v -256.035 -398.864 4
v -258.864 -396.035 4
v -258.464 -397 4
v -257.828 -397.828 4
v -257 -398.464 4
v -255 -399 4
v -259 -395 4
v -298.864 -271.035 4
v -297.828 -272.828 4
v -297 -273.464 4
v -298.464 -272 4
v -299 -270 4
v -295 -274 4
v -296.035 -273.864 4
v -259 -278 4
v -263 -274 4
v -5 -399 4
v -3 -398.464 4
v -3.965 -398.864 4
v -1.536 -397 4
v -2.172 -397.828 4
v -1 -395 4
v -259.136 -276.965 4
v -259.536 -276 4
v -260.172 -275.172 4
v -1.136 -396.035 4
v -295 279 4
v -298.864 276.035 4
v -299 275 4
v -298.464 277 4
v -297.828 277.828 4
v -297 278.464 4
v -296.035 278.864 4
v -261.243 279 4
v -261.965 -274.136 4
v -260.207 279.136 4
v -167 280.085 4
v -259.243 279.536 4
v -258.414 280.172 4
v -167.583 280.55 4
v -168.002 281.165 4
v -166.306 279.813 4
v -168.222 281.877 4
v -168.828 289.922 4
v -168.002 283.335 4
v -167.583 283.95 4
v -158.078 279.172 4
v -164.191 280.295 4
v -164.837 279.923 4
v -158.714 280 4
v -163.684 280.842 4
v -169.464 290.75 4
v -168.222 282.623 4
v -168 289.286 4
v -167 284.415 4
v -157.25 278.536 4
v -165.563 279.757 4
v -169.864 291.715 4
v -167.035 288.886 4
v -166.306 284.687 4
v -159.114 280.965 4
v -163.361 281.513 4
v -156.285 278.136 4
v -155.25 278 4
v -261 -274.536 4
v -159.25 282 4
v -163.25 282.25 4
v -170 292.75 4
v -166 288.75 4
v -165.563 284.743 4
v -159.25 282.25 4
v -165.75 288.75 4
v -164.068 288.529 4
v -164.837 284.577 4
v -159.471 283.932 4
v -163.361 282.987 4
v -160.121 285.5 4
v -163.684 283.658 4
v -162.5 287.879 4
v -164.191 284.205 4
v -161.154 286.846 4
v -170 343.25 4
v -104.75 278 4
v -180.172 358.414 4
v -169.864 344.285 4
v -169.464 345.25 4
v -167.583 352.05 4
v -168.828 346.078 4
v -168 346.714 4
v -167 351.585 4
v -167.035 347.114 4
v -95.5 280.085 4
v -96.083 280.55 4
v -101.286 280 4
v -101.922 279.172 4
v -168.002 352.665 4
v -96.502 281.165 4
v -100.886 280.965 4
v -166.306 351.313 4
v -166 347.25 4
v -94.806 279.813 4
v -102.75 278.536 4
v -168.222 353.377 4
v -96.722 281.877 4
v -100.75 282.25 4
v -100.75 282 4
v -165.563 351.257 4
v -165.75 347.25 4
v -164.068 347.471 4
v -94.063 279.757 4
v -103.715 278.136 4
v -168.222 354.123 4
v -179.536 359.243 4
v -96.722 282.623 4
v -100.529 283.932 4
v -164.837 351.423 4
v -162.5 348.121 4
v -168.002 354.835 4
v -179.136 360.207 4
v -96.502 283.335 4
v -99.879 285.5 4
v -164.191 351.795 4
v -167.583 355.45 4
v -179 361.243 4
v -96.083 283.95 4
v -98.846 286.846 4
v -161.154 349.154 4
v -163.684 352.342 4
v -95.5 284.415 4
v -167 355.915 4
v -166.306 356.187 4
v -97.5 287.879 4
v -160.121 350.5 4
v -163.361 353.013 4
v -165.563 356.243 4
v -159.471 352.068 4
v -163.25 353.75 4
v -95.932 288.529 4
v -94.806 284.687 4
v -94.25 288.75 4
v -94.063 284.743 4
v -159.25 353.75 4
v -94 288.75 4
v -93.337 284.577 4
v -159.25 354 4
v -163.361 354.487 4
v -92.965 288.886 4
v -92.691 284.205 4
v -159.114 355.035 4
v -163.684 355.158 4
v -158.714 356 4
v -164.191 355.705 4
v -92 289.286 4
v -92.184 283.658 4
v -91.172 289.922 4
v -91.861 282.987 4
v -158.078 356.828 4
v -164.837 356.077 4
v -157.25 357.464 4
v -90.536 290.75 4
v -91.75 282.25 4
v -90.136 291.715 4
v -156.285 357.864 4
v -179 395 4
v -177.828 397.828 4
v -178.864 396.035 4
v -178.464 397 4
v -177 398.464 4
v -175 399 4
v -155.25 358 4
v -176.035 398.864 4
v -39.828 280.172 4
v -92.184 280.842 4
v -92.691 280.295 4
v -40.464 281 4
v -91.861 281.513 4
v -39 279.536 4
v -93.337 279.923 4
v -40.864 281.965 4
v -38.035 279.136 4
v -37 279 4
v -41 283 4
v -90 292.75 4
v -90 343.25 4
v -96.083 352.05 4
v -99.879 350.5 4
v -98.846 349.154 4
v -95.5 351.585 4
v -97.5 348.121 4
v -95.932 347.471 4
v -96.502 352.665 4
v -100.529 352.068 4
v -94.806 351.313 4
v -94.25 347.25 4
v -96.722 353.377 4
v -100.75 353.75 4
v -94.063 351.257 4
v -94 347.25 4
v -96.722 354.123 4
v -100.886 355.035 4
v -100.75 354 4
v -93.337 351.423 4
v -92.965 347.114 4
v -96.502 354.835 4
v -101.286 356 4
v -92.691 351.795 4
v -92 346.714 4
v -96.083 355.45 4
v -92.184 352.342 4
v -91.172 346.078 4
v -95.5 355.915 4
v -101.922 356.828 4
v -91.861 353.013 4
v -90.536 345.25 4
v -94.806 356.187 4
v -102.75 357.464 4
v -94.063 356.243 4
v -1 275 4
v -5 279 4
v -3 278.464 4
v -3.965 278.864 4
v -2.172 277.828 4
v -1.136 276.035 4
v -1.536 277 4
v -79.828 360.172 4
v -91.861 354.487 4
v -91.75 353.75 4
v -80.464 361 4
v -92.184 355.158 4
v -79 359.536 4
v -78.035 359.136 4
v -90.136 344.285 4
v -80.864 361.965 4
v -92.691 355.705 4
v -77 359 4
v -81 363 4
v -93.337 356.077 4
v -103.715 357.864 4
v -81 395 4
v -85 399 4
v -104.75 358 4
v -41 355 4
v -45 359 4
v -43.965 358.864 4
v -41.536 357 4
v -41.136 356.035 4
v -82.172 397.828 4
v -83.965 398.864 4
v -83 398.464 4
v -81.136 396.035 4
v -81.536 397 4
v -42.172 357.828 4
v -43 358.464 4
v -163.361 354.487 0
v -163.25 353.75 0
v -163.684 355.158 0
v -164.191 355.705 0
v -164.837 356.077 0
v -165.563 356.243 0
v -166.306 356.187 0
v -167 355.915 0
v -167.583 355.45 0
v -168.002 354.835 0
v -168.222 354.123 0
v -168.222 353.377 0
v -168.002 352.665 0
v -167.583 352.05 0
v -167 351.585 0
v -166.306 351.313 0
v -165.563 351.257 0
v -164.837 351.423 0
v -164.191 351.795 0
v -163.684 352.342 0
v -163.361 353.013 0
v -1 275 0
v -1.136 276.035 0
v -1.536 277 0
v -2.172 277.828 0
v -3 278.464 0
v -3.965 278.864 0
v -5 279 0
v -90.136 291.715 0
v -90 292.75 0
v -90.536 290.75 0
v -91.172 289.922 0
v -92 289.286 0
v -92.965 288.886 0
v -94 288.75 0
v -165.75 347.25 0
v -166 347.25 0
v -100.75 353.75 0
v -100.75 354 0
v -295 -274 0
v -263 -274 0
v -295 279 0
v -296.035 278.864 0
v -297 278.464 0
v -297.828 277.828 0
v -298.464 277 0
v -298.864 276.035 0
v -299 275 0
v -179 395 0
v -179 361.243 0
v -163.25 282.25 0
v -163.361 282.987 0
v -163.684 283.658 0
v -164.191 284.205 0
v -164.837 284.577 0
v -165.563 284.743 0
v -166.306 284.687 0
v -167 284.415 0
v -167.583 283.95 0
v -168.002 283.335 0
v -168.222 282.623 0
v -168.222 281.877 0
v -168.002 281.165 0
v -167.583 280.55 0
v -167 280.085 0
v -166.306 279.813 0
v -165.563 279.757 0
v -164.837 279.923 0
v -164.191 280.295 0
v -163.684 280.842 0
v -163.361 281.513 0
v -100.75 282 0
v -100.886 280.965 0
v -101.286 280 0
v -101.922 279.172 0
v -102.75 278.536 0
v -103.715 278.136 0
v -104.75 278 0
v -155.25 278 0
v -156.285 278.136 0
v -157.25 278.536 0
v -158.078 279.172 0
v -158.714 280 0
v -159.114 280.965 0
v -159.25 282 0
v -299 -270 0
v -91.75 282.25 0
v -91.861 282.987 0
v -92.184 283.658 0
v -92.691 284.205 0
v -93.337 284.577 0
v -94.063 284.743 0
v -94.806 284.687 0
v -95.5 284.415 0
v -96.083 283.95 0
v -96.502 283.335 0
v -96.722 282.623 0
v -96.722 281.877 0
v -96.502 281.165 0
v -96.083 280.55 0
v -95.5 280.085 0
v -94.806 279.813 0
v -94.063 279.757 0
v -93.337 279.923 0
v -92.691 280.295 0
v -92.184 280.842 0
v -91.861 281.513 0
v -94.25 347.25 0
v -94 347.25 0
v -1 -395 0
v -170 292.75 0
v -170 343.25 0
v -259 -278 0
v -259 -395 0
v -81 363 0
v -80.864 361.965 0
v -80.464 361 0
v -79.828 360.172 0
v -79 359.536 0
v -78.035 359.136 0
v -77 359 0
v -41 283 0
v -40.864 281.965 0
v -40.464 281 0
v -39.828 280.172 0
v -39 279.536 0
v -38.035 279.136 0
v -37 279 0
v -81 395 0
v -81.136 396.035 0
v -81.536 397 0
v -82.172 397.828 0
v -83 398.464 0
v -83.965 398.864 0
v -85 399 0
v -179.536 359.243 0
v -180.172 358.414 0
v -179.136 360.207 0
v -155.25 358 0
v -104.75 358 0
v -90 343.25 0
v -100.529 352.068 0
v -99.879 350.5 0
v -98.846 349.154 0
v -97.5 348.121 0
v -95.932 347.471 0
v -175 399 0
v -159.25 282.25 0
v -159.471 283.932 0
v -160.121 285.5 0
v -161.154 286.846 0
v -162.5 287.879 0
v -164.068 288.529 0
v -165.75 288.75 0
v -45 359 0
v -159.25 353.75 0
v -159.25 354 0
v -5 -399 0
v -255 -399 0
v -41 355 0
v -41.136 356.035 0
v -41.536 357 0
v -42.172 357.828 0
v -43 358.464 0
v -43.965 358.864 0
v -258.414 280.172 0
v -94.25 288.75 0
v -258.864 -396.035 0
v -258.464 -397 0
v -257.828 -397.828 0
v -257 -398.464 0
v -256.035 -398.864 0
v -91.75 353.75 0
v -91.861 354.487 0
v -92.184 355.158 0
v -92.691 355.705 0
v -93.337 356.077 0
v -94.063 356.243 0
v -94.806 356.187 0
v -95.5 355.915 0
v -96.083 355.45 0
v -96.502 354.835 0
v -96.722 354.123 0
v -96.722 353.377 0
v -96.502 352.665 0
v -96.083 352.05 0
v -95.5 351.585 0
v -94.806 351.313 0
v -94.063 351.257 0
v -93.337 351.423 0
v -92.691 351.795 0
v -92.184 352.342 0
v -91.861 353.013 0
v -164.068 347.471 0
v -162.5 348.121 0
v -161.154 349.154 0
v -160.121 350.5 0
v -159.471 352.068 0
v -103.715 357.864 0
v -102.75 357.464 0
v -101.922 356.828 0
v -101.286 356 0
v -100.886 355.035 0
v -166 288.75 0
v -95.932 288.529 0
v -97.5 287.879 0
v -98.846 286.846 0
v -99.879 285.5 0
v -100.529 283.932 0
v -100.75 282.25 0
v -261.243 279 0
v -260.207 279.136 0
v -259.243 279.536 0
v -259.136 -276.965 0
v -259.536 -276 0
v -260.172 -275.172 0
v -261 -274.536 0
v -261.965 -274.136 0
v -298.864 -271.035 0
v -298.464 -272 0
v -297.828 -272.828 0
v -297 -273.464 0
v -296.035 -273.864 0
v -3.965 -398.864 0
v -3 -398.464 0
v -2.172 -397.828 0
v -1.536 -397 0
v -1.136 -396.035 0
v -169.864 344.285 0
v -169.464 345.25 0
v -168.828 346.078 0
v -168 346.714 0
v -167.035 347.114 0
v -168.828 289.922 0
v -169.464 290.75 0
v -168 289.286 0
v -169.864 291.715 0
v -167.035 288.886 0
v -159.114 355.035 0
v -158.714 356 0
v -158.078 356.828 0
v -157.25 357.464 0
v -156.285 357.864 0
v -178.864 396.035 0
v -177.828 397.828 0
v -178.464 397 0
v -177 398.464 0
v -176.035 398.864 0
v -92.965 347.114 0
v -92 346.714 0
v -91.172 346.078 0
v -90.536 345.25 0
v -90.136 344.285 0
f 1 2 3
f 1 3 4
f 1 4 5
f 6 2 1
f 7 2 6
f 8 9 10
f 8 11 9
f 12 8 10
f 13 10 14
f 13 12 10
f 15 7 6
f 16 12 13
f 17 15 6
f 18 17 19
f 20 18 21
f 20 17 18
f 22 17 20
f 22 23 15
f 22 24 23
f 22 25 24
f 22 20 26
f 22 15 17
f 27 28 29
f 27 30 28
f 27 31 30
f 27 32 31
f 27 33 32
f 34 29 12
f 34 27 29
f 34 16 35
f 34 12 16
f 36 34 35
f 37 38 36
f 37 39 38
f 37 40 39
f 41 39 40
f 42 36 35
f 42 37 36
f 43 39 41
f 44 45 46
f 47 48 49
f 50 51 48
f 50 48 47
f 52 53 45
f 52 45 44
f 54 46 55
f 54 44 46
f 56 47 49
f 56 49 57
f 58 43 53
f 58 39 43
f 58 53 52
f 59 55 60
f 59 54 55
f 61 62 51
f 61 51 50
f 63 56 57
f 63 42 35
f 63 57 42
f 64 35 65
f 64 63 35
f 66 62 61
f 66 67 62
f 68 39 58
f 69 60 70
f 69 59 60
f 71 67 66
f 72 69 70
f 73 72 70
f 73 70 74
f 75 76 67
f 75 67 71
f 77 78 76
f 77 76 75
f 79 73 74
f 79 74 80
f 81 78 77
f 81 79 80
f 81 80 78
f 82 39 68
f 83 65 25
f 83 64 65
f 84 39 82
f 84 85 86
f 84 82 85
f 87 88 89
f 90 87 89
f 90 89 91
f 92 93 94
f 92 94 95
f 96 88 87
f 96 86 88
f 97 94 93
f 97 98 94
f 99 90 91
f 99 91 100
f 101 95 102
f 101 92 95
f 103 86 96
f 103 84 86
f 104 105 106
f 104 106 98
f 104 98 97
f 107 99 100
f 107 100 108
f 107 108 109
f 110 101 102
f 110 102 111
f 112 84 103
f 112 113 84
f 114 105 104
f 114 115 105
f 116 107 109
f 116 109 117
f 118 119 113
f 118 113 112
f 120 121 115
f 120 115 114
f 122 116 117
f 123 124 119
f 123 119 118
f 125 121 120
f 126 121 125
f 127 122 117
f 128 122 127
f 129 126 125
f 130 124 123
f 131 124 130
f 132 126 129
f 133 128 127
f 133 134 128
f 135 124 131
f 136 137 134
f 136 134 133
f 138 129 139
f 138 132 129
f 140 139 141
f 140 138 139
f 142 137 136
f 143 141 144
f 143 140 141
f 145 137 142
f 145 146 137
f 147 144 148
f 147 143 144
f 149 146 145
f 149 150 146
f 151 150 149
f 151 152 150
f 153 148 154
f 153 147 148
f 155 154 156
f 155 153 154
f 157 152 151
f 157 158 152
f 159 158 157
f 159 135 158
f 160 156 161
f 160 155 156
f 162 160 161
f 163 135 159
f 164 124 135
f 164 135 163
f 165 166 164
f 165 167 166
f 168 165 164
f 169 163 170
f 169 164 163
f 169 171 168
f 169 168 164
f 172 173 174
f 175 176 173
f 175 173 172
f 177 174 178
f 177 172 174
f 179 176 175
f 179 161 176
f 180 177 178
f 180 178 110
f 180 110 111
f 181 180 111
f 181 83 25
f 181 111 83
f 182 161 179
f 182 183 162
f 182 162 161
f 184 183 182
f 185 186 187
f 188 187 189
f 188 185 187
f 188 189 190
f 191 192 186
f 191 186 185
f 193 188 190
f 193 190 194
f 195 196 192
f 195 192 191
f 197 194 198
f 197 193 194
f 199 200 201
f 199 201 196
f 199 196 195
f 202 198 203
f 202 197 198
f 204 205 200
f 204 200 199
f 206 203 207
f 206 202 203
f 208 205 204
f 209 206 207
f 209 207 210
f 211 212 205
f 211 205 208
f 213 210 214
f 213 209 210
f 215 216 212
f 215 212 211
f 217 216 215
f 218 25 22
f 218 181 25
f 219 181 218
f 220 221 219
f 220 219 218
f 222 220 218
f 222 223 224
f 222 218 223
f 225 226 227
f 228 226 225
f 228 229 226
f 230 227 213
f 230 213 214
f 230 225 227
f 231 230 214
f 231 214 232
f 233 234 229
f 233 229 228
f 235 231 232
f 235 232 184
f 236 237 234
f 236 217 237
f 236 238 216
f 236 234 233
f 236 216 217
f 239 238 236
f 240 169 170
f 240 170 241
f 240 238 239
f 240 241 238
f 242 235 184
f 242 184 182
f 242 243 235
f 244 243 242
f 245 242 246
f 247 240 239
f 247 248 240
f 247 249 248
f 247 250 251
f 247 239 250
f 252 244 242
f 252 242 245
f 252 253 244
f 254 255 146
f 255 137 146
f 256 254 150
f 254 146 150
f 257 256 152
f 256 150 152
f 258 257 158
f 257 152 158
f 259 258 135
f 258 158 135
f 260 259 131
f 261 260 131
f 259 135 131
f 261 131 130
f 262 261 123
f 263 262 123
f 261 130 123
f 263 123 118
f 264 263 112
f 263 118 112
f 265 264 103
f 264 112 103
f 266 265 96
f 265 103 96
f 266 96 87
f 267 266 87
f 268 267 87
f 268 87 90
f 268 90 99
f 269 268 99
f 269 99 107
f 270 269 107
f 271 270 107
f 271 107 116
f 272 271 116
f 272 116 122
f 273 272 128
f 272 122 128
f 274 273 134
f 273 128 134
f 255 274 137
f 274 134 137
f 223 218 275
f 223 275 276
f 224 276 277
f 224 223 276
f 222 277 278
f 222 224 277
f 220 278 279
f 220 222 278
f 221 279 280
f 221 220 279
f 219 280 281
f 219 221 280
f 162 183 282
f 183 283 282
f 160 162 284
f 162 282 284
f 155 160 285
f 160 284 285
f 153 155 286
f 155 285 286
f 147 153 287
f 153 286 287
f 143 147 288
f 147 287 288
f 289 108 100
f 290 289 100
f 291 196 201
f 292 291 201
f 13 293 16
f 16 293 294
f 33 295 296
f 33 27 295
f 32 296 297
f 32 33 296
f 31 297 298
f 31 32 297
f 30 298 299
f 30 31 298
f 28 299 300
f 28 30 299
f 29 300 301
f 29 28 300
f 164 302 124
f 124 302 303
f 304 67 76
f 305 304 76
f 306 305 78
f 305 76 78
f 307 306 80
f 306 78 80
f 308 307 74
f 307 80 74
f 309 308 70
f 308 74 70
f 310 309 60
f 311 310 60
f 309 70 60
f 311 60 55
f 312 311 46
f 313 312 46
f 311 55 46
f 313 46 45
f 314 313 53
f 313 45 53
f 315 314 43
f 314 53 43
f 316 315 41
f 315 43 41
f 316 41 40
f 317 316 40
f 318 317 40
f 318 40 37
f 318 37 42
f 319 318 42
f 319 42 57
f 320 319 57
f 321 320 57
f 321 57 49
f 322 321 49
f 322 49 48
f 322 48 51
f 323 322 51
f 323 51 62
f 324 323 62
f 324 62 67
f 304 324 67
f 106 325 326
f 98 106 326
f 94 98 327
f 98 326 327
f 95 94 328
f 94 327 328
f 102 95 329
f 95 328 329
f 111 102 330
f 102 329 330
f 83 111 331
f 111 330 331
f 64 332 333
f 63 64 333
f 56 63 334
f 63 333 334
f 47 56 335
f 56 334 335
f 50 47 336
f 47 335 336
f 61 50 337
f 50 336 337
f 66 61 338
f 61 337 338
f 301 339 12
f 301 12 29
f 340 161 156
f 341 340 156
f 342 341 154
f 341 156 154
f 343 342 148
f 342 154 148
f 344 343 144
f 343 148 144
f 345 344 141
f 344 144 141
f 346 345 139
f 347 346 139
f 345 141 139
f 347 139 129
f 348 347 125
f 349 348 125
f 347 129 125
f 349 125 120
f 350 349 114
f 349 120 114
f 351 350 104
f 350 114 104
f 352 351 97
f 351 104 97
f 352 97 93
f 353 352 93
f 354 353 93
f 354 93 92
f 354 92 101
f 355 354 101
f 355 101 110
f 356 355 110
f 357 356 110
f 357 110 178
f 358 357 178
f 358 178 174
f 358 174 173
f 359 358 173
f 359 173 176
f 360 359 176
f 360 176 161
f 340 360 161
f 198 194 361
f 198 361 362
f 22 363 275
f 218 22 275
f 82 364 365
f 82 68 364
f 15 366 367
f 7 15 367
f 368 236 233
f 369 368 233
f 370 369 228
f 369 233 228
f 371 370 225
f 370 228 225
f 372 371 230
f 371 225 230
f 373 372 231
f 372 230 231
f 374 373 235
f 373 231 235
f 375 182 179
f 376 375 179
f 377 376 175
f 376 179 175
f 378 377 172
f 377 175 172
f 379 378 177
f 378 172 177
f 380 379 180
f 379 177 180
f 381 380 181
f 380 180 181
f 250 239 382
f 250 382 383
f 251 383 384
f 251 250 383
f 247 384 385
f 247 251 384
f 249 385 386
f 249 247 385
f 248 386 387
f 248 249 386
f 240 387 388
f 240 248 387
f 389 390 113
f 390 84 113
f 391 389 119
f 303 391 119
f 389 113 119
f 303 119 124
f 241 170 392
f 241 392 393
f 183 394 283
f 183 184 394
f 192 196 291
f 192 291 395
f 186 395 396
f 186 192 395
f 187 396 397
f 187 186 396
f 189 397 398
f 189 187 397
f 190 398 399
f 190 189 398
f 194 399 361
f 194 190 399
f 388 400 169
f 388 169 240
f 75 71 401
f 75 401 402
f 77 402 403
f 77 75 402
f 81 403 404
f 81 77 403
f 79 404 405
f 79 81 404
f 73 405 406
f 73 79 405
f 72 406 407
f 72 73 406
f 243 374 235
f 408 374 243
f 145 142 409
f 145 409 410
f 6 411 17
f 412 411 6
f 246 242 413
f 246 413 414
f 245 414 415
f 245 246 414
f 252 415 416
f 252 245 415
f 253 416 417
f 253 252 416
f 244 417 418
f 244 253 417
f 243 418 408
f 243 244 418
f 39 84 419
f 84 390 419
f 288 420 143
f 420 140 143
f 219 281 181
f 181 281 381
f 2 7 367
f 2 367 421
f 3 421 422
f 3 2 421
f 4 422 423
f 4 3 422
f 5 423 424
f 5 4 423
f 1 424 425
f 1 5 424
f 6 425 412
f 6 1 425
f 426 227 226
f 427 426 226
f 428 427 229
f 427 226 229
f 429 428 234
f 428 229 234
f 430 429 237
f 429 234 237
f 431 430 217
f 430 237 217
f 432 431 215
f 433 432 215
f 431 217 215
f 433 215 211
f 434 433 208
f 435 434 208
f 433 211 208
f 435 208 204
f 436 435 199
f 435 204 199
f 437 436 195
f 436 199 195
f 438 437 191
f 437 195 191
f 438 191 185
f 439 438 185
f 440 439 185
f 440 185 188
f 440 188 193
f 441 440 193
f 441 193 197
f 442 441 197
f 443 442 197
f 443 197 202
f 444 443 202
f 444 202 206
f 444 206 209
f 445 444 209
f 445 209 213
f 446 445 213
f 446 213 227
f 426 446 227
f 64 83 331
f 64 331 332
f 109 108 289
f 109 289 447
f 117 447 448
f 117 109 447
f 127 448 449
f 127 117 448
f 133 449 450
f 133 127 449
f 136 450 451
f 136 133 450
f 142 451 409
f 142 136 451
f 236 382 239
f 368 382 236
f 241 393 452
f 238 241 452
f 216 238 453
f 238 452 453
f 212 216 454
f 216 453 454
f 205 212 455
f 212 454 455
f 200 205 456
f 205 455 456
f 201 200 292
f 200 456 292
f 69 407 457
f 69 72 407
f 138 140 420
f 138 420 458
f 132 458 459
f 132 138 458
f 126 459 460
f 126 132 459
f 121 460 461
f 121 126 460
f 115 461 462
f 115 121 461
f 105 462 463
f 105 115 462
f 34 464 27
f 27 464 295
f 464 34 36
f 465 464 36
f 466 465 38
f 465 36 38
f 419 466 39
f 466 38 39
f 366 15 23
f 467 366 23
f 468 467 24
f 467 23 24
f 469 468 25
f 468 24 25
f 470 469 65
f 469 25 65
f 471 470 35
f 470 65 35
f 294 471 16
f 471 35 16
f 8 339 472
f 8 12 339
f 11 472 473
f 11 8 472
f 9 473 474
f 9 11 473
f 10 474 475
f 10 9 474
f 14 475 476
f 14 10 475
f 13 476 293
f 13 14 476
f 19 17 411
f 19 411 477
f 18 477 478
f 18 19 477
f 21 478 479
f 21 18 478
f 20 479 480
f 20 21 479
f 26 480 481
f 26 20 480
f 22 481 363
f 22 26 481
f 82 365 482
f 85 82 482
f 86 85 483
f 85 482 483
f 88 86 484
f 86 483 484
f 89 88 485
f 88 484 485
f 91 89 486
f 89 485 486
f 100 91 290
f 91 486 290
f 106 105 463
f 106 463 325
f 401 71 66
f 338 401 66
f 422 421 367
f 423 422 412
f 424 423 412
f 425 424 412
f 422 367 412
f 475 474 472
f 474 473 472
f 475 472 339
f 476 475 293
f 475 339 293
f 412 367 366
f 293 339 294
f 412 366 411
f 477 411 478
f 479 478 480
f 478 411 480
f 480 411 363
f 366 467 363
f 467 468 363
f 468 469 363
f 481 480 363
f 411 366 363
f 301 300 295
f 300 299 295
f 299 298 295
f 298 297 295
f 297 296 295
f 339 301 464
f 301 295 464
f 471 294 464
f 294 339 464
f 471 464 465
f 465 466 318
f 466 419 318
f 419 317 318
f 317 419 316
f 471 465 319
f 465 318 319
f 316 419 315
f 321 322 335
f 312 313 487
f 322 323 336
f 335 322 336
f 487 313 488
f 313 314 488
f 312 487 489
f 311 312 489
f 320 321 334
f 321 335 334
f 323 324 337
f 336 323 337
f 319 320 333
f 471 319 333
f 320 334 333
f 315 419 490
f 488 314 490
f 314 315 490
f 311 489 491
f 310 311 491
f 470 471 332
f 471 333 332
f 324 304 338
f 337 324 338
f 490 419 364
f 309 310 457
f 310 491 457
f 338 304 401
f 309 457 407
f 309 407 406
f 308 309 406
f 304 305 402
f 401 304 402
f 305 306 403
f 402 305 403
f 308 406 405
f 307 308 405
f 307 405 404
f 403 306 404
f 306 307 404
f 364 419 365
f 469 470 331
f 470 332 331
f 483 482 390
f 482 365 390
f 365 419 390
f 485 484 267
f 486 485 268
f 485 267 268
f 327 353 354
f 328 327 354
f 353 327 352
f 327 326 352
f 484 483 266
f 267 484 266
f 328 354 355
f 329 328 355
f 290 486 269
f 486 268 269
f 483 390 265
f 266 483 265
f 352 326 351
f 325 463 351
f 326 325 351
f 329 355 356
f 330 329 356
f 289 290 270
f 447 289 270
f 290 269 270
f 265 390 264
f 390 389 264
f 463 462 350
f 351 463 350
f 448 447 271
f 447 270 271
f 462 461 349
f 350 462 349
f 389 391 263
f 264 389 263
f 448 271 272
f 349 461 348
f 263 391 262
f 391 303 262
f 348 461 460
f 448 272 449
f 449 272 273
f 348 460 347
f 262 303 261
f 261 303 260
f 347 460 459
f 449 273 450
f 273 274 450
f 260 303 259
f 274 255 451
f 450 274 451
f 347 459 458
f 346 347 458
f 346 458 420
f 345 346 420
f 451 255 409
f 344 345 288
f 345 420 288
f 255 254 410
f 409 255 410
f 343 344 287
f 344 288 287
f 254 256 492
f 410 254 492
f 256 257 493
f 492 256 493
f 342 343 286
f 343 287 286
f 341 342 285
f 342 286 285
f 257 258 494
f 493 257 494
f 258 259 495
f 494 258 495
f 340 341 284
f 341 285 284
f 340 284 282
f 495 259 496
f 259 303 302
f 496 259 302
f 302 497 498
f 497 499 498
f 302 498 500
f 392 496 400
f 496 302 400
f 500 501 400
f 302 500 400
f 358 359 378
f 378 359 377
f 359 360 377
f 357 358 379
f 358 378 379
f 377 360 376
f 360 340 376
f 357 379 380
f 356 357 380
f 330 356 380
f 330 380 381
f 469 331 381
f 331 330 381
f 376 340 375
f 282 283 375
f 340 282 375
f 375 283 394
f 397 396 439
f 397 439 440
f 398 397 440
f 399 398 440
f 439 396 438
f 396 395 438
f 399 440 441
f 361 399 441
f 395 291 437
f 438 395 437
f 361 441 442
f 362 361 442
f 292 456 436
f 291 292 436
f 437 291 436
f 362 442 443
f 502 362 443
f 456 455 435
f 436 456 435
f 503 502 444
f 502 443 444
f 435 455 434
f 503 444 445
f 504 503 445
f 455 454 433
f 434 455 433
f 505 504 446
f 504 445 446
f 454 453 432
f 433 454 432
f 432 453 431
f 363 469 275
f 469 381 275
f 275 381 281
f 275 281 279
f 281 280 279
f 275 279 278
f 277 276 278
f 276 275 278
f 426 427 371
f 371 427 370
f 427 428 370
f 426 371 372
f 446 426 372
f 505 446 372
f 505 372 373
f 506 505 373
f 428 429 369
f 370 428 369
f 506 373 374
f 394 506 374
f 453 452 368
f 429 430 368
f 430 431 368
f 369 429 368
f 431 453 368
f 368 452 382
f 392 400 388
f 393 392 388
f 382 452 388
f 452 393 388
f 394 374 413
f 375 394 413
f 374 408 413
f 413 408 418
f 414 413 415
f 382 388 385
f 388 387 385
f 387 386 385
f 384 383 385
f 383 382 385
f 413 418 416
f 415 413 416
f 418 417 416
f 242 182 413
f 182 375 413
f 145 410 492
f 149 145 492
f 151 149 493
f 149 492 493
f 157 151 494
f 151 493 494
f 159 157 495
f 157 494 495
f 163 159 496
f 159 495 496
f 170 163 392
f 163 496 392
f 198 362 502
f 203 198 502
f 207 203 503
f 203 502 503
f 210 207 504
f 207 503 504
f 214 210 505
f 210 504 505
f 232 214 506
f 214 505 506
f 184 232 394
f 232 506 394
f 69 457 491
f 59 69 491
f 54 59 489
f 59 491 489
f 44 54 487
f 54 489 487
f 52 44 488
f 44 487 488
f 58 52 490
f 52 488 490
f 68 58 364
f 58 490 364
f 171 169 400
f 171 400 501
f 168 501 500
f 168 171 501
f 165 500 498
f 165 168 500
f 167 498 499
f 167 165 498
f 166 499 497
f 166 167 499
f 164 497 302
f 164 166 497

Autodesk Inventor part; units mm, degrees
ref_plane "YZ Plane" through (0, 0, 0) normal (1, 0, 0) x (0, 1, 0)
ref_plane "XZ Plane" through (0, 0, 0) normal (0, 1, 0) x (-1, 0, 0)
ref_plane "XY Plane" through (0, 0, 0) normal (0, 0, 1) x (1, 0, 0)
sketch "Sketch1" plane through (0, 0, 0) normal (0, 0, 1) x (1, 0, 0)
  line L0 (-300, -400) -> (300, -400)
  line L1 (300, -400) -> (300, 400)
  line L2 (300, 400) -> (-300, 400)
  line L3 (-300, 400) -> (-300, -400)
  line L4 (-300, -400) -> (300, 400) construction
  line L5 (300, -400) -> (-300, 400) construction
  line L6 (-80, 360) -> (80, 360)
  line L7 (80, 360) -> (80, 400)
  line L8 (80, 400) -> (-80, 400)
  line L9 (-80, 400) -> (-80, 360)
  line L10 (-80, 360) -> (80, 400) construction
  line L11 (80, 360) -> (-80, 400) construction
  line L12 (-300, 280) -> (-260, 280)
  line L13 (-260, 280) -> (-180, 360)
  line L14 (-180, 360) -> (-180, 400)
  line L15 (180, 400) -> (180, 360)
  line L16 (180, 360) -> (260, 280)
  line L17 (260, 280) -> (300, 280)
  line L18 (-300, -275) -> (-260, -275)
  line L19 (-260, -275) -> (-260, -400)
  line L20 (300, -280) -> (260, -280)
  line L21 (260, -280) -> (260, -400)
  line L22 (0, 0) -> (0, 380) construction
  line L23 (-1, 360) -> (1, 360)
  line L24 (1, 360) -> (1, -400)
  line L25 (1, -400) -> (-1, -400)
  line L26 (-1, -400) -> (-1, 360)
  line L27 (-179, 400) -> (-179, 359.5858)
  line L28 (-179, 359.5858) -> (-259.5858, 279)
  line L29 (-259.5858, 279) -> (-300, 279)
  line L30 (-81, 359) -> (81, 359)
  line L31 (81, 359) -> (81, 401)
  line L32 (81, 401) -> (-81, 401)
  line L33 (-81, 401) -> (-81, 359)
  line L34 (-299, 399) -> (299, 399)
  line L35 (299, 399) -> (299, -399)
  line L36 (299, -399) -> (-299, -399)
  line L37 (-299, -399) -> (-299, 399)
  line L38 (-300, -274) -> (-259, -274)
  line L39 (-259, -274) -> (-259, -400)
  line L40 (259, -400) -> (259, -279)
  line L41 (259, -279) -> (300, -279)
  line L42 (300, 279) -> (259.5858, 279)
  line L43 (259.5858, 279) -> (179, 359.5858)
  line L44 (179, 359.5858) -> (179, 400)
  line L45 (-40, 360) -> (40, 360)
  line L46 (40, 360) -> (40, 280)
  line L47 (40, 280) -> (-40, 280)
  line L48 (-40, 280) -> (-40, 360)
  line L49 (-41, 361) -> (41, 361)
  line L50 (41, 361) -> (41, 279)
  line L51 (41, 279) -> (-41, 279)
  line L52 (-41, 279) -> (-41, 361)
  point P0 (-299, 279)
  point P1 (-299, -274)
  point P2 (-259, -399)
  point P3 (-1, -399)
  point P4 (-1, 359)
  point P5 (-81, 399)
  point P6 (-179, 399)
  point P7 (-1, 279)
  point P8 (-41, 359)
  dimension "d0" = 600
  dimension "d1" = 800
  dimension "d2" = 160
  dimension "d3" = 40
  dimension "d4" = 40
  dimension "d5" = 40
  dimension "d6" = 40
  dimension "d7" = 40
  dimension "d8" = 40
  dimension "d9" = 40
  dimension "d10" = 120
  dimension "d11" = 120
  dimension "d12" = 120
  dimension "d13" = 120
  dimension "d14" = 125
  dimension "d15" = 120
  dimension "d16" = 2
  dimension "d17" = 1
  dimension "d18" = 1
  dimension "d19" = 1
  dimension "d20" = 1
  dimension "d21" = 1
  dimension "d22" = 1
  dimension "d25" = 80
  dimension "d26" = 80
  dimension "d27" = 1
extrude "Extrusion1" add sketch "Sketch1" along normal blind 4 contours L39 L38 L37 L29 L28 L27 L34 L33 L30 L52 L51 L26 L36
fillet "Fillet1" radius 4 13 edges at (-179, 399, 2) (-179, 359.5858, 2) (-259.5858, 279, 2) (-299, 279, 2) (-81, 399, 2) (-81, 359, 2) (-41, 359, 2) (-41, 279, 2) (-1, 279, 2) (-1, -399, 2) (-259, -399, 2) (-259, -274, 2) (-299, -274, 2)
sketch "Sketch2" plane through (0, 0, 4) normal (0, 0, 1) x (1, 0, 0)
  arc A0 (-299, -270) -> (-295, -274) centre (-295, -270) ccw projected
  line L0 (-295, -274) -> (-263, -274) projected
  arc A1 (-259, -278) -> (-263, -274) centre (-263, -278) ccw projected
  line L1 (-259, -278) -> (-259, -395) projected
  arc A2 (-259, -395) -> (-255, -399) centre (-255, -395) ccw projected
  line L2 (-255, -399) -> (-5, -399) projected
  arc A3 (-5, -399) -> (-1, -395) centre (-5, -395) ccw projected
  line L3 (-1, -395) -> (-1, 275) projected
  arc A4 (-1, 275) -> (-5, 279) centre (-5, 275) ccw projected
  line L4 (-5, 279) -> (-37, 279) projected
  arc A5 (-41, 283) -> (-37, 279) centre (-37, 283) ccw projected
  line L5 (-41, 283) -> (-41, 355) projected
  arc A6 (-41, 355) -> (-45, 359) centre (-45, 355) ccw projected
  line L6 (-45, 359) -> (-77, 359) projected
  arc A7 (-81, 363) -> (-77, 359) centre (-77, 363) ccw projected
  line L7 (-81, 363) -> (-81, 395) projected
  arc A8 (-81, 395) -> (-85, 399) centre (-85, 395) ccw projected
  line L8 (-85, 399) -> (-175, 399) projected
  arc A9 (-175, 399) -> (-179, 395) centre (-175, 395) ccw projected
  line L9 (-179, 395) -> (-179, 361.2426) projected
  arc A10 (-180.1716, 358.4142) -> (-179, 361.2426) centre (-183, 361.2426) ccw projected
  line L10 (-180.1716, 358.4142) -> (-258.4142, 280.1716) projected
  arc A11 (-261.2426, 279) -> (-258.4142, 280.1716) centre (-261.2426, 283) ccw projected
  line L11 (-261.2426, 279) -> (-295, 279) projected
  arc A12 (-295, 279) -> (-299, 275) centre (-295, 275) ccw projected
  line L12 (-299, 275) -> (-299, -270) projected
  line L13 (-170, 358) -> (-90, 358)
  line L14 (-90, 358) -> (-90, 278)
  line L15 (-90, 278) -> (-170, 278)
  line L16 (-170, 278) -> (-170, 358)
  line L17 (-170, 358) -> (-90, 278) construction
  line L18 (-90, 358) -> (-170, 278) construction
  line L19 (-130, 318) -> (-130, 358) construction
  line L20 (-170, 358) -> (-175, 395) construction
  line L21 (-90, 358) -> (-85, 395) construction
  line L22 (-165.75, 282.25) -> (-94.25, 282.25) construction
  line L23 (-94.25, 282.25) -> (-94.25, 353.75) construction
  line L24 (-94.25, 353.75) -> (-165.75, 353.75) construction
  line L25 (-165.75, 353.75) -> (-165.75, 282.25) construction
  line L26 (-165.75, 282.25) -> (-94.25, 353.75) construction
  line L27 (-94.25, 282.25) -> (-165.75, 353.75) construction
  circle A13 centre (-165.75, 353.75) radius 2.5
  circle A14 centre (-94.25, 353.75) radius 2.5
  circle A15 centre (-94.25, 282.25) radius 2.5
  circle A16 centre (-165.75, 282.25) radius 2.5
  circle A17 centre (-165.75, 353.75) radius 6.5
  line L28 (-165.75, 347.25) -> (-170, 347.25)
  line L29 (-159.25, 353.75) -> (-159.25, 358)
  circle A18 centre (-165.75, 282.25) radius 6.5
  line L30 (-165.75, 288.75) -> (-170, 288.75)
  line L31 (-159.25, 282.25) -> (-159.25, 278)
  circle A19 centre (-94.25, 282.25) radius 6.5
  line L32 (-100.75, 282.25) -> (-100.75, 278)
  line L33 (-94.25, 288.75) -> (-90, 288.75)
  circle A20 centre (-94.25, 353.75) radius 6.5
  line L34 (-94.25, 347.25) -> (-90, 347.25)
  line L35 (-100.75, 353.75) -> (-100.75, 358)
  point P0 (0, 0)
  point P1 (-100.75, 358)
  point P2 (-170, 288.75)
  point P3 (-100.75, 278)
  point P4 (-90, 288.75)
  point P5 (-90, 347.25)
  dimension "d29" = 80
  dimension "d30" = 80
  dimension "d31" = 41
  dimension "d32" = 71.5
  dimension "d33" = 71.5
  dimension "d34" = 5
  dimension "d35" = 5
  dimension "d36" = 5
  dimension "d37" = 5
  dimension "d38" = 4
  dimension "d41" = 360
extrude "Extrusion2" cut sketch "Sketch2" against normal blind 4 contours L13 L35 A20 L34 L14 L33 A19 L32 L15 L31 A18 L30 L16 L28 A17 L29 | A13 | A14 | A15 | A16
fillet "Fillet2" radius 4 8 edges at (-100.75, 358, 2) (-90, 347.25, 2) (-90, 288.75, 2) (-100.75, 278, 2) (-159.25, 358, 2) (-170, 347.25, 2) (-170, 288.75, 2) (-159.25, 278, 2)
properties part number "RT_FRM_MC_014_FrontCover_L" material "Polycarbonate, Smoke"
